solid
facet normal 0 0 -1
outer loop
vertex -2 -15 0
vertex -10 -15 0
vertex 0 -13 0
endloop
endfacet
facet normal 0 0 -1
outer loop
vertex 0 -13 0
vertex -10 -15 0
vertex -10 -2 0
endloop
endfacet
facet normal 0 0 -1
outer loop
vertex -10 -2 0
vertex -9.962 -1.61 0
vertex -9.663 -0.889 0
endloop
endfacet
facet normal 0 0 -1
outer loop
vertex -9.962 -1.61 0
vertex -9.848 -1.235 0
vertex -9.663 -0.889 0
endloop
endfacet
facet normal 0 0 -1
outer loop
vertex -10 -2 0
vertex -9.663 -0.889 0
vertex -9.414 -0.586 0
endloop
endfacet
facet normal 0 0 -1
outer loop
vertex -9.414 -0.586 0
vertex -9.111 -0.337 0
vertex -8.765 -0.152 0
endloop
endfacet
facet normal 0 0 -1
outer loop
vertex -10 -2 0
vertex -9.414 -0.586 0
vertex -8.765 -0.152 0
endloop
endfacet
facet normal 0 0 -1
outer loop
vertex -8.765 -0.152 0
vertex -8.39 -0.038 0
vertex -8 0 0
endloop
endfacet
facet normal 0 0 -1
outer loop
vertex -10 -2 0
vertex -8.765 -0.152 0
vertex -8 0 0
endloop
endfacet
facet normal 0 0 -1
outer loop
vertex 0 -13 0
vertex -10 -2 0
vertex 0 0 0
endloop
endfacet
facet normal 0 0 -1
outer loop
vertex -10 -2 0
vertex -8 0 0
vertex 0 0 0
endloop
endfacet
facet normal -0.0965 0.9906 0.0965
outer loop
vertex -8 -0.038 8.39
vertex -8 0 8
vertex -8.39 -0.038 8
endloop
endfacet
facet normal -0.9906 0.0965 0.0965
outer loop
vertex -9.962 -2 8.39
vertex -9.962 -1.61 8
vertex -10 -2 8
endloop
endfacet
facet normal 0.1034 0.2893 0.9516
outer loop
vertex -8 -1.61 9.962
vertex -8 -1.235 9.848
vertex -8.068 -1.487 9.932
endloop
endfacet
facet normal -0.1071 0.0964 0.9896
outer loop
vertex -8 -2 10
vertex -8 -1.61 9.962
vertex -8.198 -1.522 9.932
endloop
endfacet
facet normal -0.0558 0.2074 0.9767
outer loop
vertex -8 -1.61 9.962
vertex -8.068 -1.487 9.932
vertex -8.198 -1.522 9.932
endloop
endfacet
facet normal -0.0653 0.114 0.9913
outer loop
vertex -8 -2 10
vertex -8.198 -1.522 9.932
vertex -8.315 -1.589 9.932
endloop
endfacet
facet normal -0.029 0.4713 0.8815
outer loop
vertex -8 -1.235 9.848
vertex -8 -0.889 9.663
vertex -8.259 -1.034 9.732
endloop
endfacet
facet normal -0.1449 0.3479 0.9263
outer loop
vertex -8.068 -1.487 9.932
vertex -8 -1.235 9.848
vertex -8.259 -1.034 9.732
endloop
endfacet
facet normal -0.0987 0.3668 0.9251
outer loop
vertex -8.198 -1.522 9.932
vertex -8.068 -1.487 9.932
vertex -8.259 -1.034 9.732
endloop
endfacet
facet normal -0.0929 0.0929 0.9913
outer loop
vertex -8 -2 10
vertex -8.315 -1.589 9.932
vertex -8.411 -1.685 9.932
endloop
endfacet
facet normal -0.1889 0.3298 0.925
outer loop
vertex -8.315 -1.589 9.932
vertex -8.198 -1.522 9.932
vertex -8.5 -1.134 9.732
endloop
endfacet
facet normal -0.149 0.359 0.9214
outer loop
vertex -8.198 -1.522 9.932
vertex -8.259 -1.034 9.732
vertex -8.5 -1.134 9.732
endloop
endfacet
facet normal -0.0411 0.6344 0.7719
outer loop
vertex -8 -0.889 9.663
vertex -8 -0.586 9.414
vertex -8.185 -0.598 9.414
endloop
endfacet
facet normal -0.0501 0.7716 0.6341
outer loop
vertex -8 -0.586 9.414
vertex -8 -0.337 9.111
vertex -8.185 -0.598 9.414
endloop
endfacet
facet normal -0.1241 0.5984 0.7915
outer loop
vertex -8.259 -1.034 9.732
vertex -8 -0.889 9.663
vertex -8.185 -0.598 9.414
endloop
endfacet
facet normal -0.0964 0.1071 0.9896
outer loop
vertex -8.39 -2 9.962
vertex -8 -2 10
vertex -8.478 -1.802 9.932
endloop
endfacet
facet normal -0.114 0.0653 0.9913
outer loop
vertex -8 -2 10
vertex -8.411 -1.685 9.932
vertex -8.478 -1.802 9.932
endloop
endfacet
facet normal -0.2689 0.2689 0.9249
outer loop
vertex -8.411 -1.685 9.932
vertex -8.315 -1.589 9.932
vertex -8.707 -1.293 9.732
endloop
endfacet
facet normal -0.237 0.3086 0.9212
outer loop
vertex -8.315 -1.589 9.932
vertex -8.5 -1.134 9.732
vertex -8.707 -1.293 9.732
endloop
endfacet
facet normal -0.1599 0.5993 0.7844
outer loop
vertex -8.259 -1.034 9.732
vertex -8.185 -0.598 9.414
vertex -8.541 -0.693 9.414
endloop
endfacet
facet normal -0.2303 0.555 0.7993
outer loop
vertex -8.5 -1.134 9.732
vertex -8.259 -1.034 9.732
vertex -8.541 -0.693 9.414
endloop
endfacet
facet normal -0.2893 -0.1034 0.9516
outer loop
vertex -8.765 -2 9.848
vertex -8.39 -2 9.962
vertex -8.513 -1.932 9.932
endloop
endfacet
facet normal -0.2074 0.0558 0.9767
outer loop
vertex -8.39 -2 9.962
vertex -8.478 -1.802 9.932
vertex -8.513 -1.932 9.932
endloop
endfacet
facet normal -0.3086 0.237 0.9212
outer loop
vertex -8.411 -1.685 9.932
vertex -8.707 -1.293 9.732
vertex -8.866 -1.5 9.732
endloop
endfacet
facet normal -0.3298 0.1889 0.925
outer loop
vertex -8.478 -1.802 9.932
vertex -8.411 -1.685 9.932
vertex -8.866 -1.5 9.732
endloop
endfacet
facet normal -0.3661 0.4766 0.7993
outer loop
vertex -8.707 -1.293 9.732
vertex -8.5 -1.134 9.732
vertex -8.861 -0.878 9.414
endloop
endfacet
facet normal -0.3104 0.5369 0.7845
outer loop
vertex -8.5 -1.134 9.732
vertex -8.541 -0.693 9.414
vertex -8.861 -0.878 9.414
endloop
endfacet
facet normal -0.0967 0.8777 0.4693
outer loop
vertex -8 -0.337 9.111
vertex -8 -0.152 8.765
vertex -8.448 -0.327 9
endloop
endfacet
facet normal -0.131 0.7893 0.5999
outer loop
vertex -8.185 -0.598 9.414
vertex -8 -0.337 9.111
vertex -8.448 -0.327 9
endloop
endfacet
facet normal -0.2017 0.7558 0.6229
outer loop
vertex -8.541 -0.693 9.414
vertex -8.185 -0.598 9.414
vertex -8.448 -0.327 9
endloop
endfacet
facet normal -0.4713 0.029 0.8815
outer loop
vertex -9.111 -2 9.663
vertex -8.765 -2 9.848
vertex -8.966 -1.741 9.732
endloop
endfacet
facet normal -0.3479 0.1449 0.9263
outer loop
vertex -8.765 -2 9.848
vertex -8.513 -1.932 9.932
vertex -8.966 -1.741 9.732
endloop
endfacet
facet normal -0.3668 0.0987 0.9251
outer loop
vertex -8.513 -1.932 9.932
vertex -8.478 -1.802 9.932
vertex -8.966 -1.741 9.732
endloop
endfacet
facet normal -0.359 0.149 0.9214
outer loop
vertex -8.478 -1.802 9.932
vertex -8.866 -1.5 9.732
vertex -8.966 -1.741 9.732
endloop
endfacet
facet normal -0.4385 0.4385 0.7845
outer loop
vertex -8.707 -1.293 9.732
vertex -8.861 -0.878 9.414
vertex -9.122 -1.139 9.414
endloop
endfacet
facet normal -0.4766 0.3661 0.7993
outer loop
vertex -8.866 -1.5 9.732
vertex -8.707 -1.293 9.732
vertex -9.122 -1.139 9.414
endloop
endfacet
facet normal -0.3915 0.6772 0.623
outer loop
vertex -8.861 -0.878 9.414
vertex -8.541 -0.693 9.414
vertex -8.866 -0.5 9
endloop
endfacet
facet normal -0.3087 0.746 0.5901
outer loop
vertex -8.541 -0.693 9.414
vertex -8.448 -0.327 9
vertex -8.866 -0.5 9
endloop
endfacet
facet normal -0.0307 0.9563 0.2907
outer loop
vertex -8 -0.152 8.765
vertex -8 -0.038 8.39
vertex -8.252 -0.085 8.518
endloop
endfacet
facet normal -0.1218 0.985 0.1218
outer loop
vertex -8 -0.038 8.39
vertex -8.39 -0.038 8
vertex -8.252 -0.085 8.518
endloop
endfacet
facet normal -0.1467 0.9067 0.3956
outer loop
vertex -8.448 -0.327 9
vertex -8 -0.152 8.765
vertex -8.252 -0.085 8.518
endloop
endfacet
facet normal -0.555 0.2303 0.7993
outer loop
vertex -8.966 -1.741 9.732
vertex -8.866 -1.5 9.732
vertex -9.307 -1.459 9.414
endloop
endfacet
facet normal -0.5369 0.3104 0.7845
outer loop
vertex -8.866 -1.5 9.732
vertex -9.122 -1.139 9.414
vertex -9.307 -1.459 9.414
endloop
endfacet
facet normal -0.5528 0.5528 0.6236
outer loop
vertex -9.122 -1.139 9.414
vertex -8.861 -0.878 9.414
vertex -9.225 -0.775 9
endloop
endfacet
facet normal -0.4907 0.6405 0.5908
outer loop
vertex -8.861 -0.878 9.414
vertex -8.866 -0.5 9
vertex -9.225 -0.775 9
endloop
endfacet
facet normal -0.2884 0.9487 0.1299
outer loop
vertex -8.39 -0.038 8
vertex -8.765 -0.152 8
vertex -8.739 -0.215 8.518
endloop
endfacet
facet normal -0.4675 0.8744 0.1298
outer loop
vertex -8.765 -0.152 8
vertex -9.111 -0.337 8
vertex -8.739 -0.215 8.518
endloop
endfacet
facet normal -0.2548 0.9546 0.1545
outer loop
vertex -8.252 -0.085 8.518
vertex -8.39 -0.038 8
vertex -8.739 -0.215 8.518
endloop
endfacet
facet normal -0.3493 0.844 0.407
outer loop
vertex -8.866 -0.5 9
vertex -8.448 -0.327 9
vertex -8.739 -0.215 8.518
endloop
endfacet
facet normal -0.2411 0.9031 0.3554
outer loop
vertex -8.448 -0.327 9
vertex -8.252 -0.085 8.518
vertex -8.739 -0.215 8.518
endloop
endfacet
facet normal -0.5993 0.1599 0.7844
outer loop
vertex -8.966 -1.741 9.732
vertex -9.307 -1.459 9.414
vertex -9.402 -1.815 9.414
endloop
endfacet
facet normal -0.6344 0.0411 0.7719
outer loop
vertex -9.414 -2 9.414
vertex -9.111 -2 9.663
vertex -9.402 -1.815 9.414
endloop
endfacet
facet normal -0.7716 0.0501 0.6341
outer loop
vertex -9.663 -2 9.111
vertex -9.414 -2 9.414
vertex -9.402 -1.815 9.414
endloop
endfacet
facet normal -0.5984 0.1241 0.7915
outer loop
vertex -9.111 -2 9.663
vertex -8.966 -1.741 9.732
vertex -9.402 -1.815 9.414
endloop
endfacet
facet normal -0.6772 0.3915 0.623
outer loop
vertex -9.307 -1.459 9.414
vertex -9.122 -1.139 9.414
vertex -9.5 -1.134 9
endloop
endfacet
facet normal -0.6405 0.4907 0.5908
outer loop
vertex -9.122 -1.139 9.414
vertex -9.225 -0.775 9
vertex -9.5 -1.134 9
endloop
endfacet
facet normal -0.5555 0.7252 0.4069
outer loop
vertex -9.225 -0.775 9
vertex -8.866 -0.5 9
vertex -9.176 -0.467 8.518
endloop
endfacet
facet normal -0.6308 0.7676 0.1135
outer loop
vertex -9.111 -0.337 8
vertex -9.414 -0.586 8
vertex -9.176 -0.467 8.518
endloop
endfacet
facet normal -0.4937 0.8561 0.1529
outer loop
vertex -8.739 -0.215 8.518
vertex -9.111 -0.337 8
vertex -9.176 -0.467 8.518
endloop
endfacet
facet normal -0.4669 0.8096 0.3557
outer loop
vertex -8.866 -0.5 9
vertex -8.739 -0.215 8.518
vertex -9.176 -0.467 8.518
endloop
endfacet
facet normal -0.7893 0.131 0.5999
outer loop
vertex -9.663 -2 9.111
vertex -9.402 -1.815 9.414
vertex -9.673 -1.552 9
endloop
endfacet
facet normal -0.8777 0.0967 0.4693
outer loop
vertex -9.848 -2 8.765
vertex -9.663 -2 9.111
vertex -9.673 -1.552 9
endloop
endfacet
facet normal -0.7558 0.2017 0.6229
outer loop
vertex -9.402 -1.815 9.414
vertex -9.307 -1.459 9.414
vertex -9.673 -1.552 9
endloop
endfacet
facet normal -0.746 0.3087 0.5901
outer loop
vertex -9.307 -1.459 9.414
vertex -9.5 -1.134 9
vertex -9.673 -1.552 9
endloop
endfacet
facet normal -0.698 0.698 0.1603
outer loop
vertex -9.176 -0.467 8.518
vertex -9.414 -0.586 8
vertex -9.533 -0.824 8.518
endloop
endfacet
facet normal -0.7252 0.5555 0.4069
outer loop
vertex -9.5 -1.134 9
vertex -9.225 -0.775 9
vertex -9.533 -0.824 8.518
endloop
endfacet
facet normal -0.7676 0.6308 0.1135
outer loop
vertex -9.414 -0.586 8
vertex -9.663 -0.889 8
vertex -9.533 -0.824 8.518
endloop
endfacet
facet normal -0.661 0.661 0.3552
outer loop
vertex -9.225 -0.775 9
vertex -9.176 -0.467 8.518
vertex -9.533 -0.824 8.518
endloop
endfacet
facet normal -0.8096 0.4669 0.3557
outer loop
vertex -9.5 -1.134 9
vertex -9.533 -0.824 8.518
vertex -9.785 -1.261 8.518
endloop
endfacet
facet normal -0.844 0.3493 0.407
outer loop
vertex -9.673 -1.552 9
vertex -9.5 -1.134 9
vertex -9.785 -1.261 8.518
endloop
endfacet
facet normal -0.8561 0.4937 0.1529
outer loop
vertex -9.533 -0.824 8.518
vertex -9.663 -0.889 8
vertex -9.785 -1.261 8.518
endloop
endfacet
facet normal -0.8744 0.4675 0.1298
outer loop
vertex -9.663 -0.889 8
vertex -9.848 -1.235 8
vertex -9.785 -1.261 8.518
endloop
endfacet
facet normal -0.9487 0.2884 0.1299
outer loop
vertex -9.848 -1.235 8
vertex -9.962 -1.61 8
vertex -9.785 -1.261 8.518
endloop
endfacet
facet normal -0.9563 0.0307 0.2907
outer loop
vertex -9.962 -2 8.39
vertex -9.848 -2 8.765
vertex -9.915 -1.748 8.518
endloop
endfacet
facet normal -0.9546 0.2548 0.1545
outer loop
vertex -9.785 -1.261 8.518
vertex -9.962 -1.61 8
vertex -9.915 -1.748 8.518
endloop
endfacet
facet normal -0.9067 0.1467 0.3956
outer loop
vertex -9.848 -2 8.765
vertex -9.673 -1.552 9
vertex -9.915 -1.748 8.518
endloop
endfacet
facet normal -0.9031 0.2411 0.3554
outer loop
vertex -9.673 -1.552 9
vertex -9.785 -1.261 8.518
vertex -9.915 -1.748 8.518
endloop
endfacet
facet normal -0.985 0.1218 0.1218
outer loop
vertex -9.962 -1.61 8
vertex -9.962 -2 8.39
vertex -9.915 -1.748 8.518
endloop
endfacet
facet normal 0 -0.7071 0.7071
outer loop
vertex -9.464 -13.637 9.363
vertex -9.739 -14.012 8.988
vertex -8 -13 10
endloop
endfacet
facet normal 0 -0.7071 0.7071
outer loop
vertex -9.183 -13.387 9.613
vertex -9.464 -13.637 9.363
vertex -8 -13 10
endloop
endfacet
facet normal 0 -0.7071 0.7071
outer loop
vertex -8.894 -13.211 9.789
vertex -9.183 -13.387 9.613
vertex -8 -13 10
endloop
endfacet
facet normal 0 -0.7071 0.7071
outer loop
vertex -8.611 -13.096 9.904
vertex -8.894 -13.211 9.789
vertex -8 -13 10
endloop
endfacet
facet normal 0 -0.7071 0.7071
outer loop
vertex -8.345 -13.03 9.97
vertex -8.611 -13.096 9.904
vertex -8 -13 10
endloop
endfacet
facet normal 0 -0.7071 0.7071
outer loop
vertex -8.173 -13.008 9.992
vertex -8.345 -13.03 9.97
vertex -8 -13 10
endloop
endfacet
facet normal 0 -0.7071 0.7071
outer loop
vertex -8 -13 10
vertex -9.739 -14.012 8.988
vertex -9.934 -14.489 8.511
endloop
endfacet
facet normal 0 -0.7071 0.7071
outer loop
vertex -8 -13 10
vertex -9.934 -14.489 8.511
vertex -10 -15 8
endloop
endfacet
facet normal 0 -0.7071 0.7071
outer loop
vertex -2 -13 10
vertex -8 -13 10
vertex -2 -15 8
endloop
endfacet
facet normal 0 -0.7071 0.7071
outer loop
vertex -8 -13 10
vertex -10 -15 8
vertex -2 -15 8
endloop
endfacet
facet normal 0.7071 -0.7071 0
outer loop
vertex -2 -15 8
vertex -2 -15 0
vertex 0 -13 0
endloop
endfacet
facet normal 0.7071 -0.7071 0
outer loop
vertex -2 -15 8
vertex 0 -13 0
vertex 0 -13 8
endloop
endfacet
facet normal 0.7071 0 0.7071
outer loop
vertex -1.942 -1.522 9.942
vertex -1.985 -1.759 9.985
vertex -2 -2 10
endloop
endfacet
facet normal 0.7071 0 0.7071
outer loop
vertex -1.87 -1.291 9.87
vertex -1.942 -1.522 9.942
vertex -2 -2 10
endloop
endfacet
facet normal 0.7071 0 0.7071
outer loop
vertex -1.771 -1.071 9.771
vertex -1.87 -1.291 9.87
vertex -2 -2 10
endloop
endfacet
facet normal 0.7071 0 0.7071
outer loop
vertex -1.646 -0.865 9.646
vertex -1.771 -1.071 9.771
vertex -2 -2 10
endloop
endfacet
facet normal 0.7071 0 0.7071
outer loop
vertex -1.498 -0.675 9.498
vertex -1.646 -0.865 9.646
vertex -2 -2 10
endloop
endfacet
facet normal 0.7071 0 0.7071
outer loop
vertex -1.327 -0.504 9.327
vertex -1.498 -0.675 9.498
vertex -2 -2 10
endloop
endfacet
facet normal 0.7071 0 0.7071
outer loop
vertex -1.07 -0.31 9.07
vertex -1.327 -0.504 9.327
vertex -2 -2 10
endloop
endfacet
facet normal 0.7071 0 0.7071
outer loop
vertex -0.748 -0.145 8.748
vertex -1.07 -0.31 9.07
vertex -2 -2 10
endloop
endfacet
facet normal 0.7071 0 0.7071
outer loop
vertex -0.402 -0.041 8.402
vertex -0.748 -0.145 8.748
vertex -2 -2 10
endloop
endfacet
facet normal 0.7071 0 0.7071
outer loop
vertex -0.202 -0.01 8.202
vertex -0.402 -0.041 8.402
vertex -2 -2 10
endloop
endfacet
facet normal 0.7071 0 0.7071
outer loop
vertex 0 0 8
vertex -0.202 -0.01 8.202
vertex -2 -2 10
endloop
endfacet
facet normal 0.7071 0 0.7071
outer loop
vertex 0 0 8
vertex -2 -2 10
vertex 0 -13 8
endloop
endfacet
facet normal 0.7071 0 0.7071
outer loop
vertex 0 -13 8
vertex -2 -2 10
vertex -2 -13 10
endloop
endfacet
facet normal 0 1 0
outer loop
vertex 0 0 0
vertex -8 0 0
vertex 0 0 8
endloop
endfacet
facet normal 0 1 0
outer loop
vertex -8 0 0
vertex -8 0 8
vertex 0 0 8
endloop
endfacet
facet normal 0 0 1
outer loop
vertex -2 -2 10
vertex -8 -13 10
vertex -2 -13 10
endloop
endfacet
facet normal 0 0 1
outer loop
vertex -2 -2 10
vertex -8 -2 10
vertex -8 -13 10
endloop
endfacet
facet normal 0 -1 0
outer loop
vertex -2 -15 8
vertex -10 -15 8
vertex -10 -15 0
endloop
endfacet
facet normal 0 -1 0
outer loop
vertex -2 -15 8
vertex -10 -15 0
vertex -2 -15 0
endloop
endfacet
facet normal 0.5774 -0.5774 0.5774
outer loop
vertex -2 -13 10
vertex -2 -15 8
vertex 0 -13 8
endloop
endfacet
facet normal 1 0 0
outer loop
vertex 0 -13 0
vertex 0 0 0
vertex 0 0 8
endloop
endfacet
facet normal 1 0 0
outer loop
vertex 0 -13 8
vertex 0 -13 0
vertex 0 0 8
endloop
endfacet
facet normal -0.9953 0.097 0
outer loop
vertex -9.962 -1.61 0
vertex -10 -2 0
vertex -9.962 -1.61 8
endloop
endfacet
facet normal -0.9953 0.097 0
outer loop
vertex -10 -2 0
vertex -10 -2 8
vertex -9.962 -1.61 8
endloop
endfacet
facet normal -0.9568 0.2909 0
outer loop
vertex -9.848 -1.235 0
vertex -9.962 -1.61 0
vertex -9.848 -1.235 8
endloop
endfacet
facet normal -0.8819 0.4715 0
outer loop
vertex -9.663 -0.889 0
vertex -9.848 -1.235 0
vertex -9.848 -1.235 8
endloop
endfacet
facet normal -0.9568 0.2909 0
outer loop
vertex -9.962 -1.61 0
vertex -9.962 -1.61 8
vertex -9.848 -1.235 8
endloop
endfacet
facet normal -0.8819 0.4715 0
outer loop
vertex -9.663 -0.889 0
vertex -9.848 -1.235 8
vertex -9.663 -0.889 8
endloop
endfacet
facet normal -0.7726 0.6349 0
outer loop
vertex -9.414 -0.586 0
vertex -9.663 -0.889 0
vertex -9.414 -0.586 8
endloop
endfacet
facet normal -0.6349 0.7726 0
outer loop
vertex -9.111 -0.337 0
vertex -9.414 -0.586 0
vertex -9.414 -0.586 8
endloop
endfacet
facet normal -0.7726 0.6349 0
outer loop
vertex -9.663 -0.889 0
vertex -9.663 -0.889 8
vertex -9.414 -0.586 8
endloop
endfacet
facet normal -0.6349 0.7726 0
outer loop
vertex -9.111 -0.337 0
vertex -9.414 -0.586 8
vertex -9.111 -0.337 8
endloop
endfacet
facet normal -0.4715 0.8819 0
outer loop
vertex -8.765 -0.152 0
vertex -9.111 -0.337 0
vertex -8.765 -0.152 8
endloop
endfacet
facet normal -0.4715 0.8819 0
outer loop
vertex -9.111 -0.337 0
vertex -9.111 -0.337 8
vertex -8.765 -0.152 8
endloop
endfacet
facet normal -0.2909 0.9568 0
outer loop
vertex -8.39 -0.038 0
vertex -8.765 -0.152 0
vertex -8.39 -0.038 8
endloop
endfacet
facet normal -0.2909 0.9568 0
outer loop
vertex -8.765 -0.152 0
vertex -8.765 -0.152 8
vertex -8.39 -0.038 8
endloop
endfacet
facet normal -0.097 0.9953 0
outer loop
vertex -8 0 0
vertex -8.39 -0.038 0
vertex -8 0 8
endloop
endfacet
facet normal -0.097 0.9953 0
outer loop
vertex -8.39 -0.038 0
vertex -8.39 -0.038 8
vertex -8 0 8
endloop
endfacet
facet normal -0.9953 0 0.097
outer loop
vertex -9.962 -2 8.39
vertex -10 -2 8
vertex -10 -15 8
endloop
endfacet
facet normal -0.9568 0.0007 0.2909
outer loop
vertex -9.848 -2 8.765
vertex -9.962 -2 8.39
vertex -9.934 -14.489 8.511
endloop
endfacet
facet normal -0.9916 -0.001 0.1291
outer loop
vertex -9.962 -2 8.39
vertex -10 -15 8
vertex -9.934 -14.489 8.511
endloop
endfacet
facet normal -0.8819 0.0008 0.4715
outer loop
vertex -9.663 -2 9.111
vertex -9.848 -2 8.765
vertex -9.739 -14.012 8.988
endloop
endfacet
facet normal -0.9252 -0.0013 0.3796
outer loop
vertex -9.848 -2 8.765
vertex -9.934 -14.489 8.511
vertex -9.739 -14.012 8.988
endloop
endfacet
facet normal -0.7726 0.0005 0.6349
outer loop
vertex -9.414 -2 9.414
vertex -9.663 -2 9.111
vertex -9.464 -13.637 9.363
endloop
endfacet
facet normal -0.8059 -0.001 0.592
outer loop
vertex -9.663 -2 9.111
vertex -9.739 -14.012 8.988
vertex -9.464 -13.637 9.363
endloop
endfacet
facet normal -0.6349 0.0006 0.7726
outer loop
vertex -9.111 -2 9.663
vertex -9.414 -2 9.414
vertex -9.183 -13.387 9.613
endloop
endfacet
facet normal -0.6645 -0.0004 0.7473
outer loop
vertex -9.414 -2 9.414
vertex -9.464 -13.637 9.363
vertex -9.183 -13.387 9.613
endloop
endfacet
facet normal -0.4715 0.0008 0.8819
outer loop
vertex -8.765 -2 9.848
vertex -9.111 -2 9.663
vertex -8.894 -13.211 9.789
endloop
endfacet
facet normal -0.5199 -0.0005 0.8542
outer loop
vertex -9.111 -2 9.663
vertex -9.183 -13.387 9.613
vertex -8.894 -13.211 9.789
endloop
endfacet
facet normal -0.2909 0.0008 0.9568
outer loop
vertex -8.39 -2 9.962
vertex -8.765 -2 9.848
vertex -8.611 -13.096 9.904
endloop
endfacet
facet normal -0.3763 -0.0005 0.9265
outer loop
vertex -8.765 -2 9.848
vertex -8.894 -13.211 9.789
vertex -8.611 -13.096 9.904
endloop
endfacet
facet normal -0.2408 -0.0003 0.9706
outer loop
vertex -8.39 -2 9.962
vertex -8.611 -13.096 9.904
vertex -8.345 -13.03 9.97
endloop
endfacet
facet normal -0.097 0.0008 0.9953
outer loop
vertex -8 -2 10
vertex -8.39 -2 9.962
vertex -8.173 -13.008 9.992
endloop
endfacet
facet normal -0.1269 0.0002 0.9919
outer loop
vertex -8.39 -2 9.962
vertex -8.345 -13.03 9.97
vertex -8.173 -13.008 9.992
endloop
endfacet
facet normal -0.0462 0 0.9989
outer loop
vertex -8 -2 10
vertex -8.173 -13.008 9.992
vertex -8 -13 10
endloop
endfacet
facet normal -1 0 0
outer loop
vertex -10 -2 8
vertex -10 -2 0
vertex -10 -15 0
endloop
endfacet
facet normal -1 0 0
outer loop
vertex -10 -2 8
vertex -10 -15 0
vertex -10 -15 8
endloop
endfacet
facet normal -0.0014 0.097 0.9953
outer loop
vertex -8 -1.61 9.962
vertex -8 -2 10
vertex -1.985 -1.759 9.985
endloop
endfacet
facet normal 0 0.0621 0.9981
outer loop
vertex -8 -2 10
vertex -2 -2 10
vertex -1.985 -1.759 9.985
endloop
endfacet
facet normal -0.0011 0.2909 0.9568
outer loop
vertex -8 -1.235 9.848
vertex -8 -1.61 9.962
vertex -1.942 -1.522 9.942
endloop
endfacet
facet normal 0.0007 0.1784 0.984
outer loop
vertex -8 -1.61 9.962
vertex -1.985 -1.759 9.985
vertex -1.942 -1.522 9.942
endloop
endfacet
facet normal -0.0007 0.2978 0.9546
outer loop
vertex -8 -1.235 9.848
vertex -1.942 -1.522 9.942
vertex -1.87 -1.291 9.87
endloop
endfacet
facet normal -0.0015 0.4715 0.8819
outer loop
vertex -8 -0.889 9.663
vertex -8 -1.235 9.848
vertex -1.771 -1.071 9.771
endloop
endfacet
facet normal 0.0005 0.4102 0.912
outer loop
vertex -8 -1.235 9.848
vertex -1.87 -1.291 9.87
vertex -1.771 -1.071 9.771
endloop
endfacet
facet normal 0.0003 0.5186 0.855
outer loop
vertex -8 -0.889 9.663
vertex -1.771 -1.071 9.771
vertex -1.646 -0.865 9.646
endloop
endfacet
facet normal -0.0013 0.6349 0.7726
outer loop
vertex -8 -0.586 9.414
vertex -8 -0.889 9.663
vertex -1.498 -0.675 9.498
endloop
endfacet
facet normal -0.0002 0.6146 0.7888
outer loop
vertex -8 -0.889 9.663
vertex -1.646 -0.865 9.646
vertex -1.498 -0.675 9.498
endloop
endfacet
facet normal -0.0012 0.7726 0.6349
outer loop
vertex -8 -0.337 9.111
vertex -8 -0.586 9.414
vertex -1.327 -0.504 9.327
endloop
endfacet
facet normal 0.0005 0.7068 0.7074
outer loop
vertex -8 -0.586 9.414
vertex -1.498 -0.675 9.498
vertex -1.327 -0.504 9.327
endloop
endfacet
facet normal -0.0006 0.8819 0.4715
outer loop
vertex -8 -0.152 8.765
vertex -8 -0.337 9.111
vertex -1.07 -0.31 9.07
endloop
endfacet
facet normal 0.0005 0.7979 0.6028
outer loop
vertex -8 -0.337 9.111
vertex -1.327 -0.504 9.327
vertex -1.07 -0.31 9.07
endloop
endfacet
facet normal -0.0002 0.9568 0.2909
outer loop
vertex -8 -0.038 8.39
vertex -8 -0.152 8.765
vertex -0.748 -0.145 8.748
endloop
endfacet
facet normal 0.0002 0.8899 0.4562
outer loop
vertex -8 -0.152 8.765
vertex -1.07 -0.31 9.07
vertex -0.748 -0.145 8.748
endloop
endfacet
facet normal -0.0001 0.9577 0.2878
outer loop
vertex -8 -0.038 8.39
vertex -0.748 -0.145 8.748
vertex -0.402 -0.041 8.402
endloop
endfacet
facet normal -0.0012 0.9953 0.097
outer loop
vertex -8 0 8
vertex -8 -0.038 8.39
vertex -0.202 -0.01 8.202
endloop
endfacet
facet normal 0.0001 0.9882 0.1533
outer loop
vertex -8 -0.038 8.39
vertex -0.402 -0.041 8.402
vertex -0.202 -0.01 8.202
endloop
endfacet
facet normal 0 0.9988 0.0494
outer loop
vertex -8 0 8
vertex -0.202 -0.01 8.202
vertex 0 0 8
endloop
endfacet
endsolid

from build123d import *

# Parameters (mm, degrees)
F0_W     = 10
F0_H     = 10
F1_DEPTH = 15
F2_SIZE  = 2
F3_R     = 2


with BuildPart() as f1:
    # F0 (on Front) → F1 (new body)
    with BuildSketch(Plane.XZ):
        with Locations((-5, 5)):
            Rectangle(F0_W, F0_H)
    extrude(amount=F1_DEPTH)

    # F2
    f2_edges = [f1.edges().sort_by_distance(p)[0] for p in [
        (-5, -15, 10),
        (0, -15, 5),
        (0, -7.5, 10),
    ]]
    chamfer(f2_edges, length=F2_SIZE)

    # F3
    f3_edges = [f1.edges().sort_by_distance(p)[0] for p in [
        (-10, 0, 5),
        (-6, 0, 10),
        (-10, -6.5, 10),
    ]]
    fillet(f3_edges, radius=F3_R)


solid = f1.part
